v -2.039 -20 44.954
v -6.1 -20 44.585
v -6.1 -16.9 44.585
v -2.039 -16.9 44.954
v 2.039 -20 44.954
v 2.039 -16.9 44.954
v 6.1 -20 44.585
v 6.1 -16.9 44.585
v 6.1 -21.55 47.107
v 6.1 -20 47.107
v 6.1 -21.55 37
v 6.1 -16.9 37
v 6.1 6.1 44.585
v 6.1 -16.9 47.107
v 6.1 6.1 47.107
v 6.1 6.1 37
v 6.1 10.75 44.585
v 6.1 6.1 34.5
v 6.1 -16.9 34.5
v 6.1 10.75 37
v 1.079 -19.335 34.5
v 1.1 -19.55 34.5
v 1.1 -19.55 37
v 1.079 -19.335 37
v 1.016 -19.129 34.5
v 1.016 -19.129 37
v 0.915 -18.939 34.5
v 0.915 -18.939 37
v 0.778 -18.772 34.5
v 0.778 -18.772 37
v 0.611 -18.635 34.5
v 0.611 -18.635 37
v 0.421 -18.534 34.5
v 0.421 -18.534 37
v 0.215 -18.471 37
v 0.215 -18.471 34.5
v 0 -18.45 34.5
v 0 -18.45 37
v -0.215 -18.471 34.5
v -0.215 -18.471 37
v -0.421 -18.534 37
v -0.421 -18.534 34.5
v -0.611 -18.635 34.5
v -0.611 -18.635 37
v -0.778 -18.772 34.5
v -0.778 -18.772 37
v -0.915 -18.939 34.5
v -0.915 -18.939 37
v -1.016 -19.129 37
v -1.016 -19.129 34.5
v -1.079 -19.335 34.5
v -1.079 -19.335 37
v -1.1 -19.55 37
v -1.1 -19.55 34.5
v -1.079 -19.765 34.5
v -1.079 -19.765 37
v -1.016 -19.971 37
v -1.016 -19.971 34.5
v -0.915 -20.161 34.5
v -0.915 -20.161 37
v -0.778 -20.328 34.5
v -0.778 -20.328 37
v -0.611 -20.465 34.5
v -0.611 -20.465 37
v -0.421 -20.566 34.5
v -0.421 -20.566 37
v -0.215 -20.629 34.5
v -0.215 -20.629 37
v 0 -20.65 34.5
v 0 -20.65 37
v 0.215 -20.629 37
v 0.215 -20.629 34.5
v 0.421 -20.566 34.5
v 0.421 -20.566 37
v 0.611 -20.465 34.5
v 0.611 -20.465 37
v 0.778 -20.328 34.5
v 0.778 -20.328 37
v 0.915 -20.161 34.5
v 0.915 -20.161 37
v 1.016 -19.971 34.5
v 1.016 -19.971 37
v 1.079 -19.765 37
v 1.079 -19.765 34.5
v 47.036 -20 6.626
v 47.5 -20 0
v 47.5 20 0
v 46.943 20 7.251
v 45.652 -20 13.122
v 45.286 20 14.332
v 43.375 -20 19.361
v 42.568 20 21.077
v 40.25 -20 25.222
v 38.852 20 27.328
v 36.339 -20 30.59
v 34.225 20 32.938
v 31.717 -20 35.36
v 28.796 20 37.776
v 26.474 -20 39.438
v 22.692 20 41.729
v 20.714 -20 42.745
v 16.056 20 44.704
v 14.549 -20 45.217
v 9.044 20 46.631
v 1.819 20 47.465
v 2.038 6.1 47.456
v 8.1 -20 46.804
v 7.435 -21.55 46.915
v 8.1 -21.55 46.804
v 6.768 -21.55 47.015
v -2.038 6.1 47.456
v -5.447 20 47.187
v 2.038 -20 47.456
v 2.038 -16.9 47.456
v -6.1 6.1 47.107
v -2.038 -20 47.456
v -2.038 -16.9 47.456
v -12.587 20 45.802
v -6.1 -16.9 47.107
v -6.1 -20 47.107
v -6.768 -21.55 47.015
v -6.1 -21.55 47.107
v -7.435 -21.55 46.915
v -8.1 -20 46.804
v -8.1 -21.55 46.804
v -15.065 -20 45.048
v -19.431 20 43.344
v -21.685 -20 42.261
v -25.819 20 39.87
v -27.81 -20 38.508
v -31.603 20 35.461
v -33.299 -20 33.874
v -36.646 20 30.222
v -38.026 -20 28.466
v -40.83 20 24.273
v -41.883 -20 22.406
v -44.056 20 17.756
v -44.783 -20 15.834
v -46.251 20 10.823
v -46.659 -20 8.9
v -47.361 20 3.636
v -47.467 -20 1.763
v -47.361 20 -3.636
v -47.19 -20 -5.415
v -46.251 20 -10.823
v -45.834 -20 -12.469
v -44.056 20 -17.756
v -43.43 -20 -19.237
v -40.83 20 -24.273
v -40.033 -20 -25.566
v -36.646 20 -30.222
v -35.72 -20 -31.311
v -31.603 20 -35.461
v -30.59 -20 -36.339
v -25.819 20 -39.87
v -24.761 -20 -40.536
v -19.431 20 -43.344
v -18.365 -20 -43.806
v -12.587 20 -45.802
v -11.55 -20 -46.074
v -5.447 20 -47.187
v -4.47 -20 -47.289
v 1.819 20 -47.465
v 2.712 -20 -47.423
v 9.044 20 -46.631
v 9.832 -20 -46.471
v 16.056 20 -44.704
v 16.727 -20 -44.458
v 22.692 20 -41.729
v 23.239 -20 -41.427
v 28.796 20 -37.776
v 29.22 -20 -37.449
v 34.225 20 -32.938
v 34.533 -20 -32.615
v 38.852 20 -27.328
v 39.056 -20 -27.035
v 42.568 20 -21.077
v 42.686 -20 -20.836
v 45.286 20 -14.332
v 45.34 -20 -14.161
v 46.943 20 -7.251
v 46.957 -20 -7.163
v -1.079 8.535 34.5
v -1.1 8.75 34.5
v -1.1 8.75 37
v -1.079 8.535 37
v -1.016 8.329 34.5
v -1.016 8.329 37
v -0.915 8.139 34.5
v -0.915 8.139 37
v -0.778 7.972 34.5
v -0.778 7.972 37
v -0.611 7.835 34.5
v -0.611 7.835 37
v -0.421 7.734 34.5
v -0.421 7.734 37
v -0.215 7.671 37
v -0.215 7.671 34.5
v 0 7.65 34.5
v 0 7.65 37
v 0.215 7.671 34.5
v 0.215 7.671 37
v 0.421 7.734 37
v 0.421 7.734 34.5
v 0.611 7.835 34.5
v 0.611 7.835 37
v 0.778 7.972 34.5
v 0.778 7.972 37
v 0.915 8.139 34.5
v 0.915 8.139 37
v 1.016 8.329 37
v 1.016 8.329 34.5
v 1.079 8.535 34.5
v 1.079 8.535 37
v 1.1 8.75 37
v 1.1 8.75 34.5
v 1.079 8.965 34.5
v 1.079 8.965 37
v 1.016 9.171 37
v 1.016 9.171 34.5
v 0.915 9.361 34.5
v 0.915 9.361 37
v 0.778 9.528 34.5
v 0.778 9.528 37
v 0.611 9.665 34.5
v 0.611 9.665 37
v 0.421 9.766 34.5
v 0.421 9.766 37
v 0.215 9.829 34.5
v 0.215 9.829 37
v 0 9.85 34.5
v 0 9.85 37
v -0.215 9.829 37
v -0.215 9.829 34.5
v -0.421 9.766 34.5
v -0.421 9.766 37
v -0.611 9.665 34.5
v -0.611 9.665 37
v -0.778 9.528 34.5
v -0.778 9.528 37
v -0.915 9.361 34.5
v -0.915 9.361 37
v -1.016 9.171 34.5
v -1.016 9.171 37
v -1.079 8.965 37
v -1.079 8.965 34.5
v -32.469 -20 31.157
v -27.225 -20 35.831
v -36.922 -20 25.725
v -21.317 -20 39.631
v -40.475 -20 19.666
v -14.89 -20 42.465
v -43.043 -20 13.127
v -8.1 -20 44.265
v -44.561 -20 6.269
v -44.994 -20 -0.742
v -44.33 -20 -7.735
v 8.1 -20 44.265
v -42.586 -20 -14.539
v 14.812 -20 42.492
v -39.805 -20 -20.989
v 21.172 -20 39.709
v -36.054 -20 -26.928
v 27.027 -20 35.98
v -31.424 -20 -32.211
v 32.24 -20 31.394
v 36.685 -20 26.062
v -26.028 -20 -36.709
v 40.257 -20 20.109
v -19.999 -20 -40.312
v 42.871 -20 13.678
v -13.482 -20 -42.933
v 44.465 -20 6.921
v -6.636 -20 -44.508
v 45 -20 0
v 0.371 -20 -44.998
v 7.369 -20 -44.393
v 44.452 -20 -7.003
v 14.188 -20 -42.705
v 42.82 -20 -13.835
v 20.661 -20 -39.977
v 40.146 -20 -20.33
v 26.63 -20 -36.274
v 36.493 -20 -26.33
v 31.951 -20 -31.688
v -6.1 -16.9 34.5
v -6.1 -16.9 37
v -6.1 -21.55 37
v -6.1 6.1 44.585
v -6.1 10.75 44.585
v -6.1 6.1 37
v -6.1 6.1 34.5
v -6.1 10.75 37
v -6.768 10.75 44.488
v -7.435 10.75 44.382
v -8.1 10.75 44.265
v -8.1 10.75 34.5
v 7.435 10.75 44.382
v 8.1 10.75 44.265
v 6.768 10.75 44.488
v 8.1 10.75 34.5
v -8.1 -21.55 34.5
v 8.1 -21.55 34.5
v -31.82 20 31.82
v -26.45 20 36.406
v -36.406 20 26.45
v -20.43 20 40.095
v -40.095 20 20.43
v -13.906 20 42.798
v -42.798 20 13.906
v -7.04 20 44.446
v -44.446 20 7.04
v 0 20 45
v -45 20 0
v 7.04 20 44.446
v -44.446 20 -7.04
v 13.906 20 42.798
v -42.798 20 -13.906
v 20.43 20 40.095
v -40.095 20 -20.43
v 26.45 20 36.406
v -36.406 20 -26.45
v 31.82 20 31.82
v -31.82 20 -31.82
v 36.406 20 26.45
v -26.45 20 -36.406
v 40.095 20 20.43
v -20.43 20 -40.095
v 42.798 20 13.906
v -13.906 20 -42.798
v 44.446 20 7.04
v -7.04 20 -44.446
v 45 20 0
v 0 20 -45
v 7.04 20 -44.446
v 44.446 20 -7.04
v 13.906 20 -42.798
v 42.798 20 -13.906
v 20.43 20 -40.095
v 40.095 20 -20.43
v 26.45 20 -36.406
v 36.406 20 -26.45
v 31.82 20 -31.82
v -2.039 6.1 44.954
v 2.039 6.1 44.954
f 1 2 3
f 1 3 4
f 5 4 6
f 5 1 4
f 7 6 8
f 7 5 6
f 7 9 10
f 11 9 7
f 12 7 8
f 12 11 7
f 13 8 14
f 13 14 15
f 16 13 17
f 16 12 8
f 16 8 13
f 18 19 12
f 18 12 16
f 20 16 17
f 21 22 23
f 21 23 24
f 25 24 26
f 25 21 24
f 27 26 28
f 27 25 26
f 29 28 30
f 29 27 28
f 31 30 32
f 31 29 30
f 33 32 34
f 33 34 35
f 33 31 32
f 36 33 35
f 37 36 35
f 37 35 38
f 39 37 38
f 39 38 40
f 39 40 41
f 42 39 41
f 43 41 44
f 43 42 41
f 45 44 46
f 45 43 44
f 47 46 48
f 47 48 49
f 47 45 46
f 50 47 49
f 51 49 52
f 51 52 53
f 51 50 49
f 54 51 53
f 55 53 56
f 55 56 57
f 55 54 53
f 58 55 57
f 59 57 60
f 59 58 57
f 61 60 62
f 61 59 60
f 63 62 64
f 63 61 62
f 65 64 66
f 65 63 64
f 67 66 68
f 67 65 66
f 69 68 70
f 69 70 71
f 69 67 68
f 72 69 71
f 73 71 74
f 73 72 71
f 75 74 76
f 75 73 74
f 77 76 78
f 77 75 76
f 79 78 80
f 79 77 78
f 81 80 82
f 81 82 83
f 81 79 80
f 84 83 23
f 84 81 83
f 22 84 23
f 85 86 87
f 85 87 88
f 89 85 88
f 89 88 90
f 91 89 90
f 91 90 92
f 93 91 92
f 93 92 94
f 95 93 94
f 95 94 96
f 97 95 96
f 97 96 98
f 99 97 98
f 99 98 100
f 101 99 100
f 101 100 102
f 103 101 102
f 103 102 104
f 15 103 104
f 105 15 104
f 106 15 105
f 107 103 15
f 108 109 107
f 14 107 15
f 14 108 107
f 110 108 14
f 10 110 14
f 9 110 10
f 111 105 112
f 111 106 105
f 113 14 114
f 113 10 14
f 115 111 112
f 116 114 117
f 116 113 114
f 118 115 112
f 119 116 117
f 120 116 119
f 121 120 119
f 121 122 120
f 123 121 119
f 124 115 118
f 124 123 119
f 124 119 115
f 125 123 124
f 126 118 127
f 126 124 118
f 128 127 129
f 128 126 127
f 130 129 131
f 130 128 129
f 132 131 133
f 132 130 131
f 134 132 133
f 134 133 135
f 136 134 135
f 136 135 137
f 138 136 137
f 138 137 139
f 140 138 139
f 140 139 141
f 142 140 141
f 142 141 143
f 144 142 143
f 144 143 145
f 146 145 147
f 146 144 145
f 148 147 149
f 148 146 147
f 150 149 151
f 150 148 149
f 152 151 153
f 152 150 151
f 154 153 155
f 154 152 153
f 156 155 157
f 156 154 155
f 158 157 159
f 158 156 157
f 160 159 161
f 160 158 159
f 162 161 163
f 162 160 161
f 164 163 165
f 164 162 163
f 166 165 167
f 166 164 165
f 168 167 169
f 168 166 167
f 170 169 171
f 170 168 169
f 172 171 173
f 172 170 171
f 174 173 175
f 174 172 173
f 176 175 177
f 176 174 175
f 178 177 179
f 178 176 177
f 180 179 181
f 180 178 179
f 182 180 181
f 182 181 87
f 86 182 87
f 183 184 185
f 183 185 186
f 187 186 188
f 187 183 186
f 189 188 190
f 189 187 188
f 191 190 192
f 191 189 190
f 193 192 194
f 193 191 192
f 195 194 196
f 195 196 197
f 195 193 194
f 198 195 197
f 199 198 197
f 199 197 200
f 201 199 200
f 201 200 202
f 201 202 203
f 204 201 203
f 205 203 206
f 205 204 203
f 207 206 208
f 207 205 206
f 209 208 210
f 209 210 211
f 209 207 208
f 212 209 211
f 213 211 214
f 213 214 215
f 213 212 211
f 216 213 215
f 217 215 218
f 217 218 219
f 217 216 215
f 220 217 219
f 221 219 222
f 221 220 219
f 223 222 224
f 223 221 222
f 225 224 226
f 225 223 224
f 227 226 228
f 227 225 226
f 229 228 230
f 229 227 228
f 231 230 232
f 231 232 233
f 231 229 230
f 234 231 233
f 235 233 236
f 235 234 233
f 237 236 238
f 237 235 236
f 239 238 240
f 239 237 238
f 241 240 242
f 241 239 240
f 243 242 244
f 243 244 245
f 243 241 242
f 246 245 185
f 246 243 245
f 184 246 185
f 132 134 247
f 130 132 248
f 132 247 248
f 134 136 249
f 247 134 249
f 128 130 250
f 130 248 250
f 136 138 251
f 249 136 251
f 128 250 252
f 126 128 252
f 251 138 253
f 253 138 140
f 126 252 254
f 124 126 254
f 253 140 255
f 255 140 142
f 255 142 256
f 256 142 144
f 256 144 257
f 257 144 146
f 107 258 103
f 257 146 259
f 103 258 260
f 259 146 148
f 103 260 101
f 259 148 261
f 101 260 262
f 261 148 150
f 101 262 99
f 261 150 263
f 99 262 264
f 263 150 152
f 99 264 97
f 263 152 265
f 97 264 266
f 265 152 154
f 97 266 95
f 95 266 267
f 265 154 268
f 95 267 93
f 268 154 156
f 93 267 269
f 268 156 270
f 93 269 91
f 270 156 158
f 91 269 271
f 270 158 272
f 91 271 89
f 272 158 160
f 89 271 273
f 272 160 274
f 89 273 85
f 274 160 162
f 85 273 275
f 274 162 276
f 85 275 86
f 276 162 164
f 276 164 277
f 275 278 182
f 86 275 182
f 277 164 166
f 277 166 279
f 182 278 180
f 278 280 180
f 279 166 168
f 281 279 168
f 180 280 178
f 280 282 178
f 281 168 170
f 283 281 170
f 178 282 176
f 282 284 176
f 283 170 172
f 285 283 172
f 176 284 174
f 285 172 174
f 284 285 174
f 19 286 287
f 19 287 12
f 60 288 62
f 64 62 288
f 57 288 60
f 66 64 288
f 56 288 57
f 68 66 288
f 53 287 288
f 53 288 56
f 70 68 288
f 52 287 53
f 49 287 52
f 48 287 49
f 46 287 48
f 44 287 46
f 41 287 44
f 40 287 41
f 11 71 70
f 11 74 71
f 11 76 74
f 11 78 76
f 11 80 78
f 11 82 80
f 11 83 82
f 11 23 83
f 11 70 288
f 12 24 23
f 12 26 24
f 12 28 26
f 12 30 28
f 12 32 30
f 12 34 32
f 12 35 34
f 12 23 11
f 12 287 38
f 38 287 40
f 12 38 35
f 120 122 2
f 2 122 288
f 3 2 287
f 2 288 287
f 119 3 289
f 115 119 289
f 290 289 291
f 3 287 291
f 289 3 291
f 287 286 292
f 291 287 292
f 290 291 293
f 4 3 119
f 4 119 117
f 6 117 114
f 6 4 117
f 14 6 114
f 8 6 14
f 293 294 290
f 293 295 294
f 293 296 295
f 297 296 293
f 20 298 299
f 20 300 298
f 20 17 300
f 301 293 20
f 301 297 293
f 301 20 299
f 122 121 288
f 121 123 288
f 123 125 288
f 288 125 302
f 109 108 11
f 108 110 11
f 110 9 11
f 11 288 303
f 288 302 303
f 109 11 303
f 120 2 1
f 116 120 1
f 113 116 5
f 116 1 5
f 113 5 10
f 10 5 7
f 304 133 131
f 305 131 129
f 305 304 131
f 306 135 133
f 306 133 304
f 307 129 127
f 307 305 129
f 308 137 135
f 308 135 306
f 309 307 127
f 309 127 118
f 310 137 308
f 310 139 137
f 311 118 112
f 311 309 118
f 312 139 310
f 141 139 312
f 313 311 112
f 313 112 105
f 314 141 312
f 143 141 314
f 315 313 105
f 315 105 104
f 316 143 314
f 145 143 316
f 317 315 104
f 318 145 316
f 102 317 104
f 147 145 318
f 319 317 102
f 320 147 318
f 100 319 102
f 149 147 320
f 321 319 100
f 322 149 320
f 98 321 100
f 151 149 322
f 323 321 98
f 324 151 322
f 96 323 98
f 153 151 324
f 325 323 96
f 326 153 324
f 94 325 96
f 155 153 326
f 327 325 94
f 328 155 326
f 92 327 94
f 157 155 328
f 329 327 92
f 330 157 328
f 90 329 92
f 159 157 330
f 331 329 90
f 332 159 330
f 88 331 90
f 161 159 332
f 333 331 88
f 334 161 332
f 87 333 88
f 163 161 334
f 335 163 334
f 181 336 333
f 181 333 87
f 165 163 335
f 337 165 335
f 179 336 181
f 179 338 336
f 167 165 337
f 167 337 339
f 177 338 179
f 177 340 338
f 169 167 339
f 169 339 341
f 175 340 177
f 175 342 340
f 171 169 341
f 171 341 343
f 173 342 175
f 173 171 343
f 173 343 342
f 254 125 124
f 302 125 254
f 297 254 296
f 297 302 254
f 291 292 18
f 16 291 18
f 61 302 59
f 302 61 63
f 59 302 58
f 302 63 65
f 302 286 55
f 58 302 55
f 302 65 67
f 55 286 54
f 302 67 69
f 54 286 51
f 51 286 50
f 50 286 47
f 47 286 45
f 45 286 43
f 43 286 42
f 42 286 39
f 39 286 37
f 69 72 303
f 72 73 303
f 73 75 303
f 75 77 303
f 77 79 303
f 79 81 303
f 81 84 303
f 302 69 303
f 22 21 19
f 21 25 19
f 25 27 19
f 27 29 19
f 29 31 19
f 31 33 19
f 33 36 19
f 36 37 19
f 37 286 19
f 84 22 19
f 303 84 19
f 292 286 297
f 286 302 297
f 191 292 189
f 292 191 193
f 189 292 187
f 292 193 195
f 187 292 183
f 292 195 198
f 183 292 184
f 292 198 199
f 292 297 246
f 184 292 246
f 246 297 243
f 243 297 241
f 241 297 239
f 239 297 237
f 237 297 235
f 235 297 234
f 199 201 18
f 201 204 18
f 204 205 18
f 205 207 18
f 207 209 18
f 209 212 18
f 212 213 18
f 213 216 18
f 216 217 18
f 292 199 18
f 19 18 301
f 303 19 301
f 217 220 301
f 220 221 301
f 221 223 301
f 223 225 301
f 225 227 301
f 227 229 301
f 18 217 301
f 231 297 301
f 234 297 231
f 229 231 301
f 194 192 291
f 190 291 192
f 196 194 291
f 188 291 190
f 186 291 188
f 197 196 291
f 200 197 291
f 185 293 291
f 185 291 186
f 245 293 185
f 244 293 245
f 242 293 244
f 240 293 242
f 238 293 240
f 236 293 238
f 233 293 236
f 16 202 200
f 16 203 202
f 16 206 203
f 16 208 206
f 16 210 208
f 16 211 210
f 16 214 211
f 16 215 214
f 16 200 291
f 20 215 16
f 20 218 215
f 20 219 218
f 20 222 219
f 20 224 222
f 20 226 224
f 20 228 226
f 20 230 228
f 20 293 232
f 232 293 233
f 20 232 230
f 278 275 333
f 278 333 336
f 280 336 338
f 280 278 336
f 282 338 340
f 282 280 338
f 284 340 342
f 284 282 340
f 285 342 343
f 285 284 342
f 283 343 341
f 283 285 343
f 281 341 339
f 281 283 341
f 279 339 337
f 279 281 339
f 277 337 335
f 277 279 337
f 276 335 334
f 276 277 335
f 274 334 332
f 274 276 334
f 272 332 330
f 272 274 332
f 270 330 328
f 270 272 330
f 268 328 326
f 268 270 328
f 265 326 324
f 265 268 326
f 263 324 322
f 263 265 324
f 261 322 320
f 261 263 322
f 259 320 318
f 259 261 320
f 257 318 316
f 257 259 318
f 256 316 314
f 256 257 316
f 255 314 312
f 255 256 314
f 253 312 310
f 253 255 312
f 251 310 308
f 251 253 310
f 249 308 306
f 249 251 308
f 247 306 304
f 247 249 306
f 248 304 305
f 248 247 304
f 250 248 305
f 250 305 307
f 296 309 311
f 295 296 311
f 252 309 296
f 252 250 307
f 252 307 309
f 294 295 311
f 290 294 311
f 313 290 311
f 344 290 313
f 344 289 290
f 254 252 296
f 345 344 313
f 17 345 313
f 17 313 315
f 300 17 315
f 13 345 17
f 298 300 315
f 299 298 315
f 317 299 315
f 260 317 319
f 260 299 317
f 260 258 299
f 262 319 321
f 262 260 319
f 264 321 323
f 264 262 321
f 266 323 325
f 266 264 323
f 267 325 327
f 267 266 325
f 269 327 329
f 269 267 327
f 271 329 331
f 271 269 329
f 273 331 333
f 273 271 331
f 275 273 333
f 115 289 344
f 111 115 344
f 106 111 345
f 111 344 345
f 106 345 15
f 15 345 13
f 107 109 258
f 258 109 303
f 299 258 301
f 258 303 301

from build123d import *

# Parameters (mm, degrees)
SKETCH1_R                = 47.5
SKETCH1_R_2              = 45
EXTRUDE_THIN1_DEPTH      = 20
BOSS_EXTRUDE1_REACH      = 98.852
BOSS_EXTRUDE1_END_RADIUS = 47.5
SKETCH2_W                = 2
SKETCH2_H                = 32.3
SKETCH3_W                = 12.2
SKETCH3_H                = 4.65
SKETCH3_R                = 1.1
BOSS_EXTRUDE2_DEPTH      = 2.5
SKETCH4_W                = 12.2
SKETCH4_H                = 23
CUT_EXTRUDE1_DEPTH       = 98.183602012


with BuildPart() as part:
    # Sketch1 → Extrude-Thin1 (new, symmetric)
    with BuildSketch(Plane(origin=(0, 0, 0), x_dir=(1, 0, 0), z_dir=(0, 1, 0))):
        Circle(SKETCH1_R)
        Circle(SKETCH1_R_2, mode=Mode.SUBTRACT)
    extrude(amount=EXTRUDE_THIN1_DEPTH, both=True)

    # Boss-Extrude1: up to this cylinder (the profile starts inside it)
    boss_extrude1_end = Plane(origin=(0, -5.4, 0), z_dir=(0, -1, 0)) * Cylinder(BOSS_EXTRUDE1_END_RADIUS, 293.704, mode=Mode.PRIVATE)
    # Sketch2 → Boss-Extrude1 (add, up to the surface)
    with BuildSketch(Plane.XY.offset(34.5), mode=Mode.PRIVATE) as boss_extrude1_sk1:
        with Locations((-7.1, -5.4)):
            Rectangle(SKETCH2_W, SKETCH2_H)
    boss_extrude1_tool1 = extrude(boss_extrude1_sk1.sketch, amount=BOSS_EXTRUDE1_REACH, mode=Mode.PRIVATE) & boss_extrude1_end
    add(boss_extrude1_tool1.solids().sort_by_distance((-7.1, -5.4, 34.5))[0])
    # Sketch2 → Boss-Extrude1 (add, up to the surface)
    with BuildSketch(Plane.XY.offset(34.5), mode=Mode.PRIVATE) as boss_extrude1_sk2:
        with Locations((7.1, -5.4)):
            Rectangle(SKETCH2_W, SKETCH2_H)
    boss_extrude1_tool2 = extrude(boss_extrude1_sk2.sketch, amount=BOSS_EXTRUDE1_REACH, mode=Mode.PRIVATE) & boss_extrude1_end
    add(boss_extrude1_tool2.solids().sort_by_distance((7.1, -5.4, 34.5))[0])

    # Sketch3 → Boss-Extrude2 (add)
    # profile 1 of 2: a face of its own
    with BuildSketch(Plane.XY.offset(34.5)):
        with Locations((0, -19.225)):
            Rectangle(SKETCH3_W, SKETCH3_H)
        with Locations((0, -19.55)):
            Circle(SKETCH3_R, mode=Mode.SUBTRACT)
    # profile 2 of 2: a face of its own
    with BuildSketch(Plane.XY.offset(34.5)):
        with Locations((0, 8.425)):
            Rectangle(SKETCH3_W, SKETCH3_H)
        with Locations((0, 8.75)):
            Circle(SKETCH3_R, mode=Mode.SUBTRACT)
    extrude(amount=BOSS_EXTRUDE2_DEPTH)

    # Sketch4 → Cut-Extrude1 (cut, through all)
    with BuildSketch(Plane.XY.offset(34.5)):
        with Locations((0, -5.4)):
            Rectangle(SKETCH4_W, SKETCH4_H)
    extrude(amount=CUT_EXTRUDE1_DEPTH, mode=Mode.SUBTRACT)


solid = part.part
